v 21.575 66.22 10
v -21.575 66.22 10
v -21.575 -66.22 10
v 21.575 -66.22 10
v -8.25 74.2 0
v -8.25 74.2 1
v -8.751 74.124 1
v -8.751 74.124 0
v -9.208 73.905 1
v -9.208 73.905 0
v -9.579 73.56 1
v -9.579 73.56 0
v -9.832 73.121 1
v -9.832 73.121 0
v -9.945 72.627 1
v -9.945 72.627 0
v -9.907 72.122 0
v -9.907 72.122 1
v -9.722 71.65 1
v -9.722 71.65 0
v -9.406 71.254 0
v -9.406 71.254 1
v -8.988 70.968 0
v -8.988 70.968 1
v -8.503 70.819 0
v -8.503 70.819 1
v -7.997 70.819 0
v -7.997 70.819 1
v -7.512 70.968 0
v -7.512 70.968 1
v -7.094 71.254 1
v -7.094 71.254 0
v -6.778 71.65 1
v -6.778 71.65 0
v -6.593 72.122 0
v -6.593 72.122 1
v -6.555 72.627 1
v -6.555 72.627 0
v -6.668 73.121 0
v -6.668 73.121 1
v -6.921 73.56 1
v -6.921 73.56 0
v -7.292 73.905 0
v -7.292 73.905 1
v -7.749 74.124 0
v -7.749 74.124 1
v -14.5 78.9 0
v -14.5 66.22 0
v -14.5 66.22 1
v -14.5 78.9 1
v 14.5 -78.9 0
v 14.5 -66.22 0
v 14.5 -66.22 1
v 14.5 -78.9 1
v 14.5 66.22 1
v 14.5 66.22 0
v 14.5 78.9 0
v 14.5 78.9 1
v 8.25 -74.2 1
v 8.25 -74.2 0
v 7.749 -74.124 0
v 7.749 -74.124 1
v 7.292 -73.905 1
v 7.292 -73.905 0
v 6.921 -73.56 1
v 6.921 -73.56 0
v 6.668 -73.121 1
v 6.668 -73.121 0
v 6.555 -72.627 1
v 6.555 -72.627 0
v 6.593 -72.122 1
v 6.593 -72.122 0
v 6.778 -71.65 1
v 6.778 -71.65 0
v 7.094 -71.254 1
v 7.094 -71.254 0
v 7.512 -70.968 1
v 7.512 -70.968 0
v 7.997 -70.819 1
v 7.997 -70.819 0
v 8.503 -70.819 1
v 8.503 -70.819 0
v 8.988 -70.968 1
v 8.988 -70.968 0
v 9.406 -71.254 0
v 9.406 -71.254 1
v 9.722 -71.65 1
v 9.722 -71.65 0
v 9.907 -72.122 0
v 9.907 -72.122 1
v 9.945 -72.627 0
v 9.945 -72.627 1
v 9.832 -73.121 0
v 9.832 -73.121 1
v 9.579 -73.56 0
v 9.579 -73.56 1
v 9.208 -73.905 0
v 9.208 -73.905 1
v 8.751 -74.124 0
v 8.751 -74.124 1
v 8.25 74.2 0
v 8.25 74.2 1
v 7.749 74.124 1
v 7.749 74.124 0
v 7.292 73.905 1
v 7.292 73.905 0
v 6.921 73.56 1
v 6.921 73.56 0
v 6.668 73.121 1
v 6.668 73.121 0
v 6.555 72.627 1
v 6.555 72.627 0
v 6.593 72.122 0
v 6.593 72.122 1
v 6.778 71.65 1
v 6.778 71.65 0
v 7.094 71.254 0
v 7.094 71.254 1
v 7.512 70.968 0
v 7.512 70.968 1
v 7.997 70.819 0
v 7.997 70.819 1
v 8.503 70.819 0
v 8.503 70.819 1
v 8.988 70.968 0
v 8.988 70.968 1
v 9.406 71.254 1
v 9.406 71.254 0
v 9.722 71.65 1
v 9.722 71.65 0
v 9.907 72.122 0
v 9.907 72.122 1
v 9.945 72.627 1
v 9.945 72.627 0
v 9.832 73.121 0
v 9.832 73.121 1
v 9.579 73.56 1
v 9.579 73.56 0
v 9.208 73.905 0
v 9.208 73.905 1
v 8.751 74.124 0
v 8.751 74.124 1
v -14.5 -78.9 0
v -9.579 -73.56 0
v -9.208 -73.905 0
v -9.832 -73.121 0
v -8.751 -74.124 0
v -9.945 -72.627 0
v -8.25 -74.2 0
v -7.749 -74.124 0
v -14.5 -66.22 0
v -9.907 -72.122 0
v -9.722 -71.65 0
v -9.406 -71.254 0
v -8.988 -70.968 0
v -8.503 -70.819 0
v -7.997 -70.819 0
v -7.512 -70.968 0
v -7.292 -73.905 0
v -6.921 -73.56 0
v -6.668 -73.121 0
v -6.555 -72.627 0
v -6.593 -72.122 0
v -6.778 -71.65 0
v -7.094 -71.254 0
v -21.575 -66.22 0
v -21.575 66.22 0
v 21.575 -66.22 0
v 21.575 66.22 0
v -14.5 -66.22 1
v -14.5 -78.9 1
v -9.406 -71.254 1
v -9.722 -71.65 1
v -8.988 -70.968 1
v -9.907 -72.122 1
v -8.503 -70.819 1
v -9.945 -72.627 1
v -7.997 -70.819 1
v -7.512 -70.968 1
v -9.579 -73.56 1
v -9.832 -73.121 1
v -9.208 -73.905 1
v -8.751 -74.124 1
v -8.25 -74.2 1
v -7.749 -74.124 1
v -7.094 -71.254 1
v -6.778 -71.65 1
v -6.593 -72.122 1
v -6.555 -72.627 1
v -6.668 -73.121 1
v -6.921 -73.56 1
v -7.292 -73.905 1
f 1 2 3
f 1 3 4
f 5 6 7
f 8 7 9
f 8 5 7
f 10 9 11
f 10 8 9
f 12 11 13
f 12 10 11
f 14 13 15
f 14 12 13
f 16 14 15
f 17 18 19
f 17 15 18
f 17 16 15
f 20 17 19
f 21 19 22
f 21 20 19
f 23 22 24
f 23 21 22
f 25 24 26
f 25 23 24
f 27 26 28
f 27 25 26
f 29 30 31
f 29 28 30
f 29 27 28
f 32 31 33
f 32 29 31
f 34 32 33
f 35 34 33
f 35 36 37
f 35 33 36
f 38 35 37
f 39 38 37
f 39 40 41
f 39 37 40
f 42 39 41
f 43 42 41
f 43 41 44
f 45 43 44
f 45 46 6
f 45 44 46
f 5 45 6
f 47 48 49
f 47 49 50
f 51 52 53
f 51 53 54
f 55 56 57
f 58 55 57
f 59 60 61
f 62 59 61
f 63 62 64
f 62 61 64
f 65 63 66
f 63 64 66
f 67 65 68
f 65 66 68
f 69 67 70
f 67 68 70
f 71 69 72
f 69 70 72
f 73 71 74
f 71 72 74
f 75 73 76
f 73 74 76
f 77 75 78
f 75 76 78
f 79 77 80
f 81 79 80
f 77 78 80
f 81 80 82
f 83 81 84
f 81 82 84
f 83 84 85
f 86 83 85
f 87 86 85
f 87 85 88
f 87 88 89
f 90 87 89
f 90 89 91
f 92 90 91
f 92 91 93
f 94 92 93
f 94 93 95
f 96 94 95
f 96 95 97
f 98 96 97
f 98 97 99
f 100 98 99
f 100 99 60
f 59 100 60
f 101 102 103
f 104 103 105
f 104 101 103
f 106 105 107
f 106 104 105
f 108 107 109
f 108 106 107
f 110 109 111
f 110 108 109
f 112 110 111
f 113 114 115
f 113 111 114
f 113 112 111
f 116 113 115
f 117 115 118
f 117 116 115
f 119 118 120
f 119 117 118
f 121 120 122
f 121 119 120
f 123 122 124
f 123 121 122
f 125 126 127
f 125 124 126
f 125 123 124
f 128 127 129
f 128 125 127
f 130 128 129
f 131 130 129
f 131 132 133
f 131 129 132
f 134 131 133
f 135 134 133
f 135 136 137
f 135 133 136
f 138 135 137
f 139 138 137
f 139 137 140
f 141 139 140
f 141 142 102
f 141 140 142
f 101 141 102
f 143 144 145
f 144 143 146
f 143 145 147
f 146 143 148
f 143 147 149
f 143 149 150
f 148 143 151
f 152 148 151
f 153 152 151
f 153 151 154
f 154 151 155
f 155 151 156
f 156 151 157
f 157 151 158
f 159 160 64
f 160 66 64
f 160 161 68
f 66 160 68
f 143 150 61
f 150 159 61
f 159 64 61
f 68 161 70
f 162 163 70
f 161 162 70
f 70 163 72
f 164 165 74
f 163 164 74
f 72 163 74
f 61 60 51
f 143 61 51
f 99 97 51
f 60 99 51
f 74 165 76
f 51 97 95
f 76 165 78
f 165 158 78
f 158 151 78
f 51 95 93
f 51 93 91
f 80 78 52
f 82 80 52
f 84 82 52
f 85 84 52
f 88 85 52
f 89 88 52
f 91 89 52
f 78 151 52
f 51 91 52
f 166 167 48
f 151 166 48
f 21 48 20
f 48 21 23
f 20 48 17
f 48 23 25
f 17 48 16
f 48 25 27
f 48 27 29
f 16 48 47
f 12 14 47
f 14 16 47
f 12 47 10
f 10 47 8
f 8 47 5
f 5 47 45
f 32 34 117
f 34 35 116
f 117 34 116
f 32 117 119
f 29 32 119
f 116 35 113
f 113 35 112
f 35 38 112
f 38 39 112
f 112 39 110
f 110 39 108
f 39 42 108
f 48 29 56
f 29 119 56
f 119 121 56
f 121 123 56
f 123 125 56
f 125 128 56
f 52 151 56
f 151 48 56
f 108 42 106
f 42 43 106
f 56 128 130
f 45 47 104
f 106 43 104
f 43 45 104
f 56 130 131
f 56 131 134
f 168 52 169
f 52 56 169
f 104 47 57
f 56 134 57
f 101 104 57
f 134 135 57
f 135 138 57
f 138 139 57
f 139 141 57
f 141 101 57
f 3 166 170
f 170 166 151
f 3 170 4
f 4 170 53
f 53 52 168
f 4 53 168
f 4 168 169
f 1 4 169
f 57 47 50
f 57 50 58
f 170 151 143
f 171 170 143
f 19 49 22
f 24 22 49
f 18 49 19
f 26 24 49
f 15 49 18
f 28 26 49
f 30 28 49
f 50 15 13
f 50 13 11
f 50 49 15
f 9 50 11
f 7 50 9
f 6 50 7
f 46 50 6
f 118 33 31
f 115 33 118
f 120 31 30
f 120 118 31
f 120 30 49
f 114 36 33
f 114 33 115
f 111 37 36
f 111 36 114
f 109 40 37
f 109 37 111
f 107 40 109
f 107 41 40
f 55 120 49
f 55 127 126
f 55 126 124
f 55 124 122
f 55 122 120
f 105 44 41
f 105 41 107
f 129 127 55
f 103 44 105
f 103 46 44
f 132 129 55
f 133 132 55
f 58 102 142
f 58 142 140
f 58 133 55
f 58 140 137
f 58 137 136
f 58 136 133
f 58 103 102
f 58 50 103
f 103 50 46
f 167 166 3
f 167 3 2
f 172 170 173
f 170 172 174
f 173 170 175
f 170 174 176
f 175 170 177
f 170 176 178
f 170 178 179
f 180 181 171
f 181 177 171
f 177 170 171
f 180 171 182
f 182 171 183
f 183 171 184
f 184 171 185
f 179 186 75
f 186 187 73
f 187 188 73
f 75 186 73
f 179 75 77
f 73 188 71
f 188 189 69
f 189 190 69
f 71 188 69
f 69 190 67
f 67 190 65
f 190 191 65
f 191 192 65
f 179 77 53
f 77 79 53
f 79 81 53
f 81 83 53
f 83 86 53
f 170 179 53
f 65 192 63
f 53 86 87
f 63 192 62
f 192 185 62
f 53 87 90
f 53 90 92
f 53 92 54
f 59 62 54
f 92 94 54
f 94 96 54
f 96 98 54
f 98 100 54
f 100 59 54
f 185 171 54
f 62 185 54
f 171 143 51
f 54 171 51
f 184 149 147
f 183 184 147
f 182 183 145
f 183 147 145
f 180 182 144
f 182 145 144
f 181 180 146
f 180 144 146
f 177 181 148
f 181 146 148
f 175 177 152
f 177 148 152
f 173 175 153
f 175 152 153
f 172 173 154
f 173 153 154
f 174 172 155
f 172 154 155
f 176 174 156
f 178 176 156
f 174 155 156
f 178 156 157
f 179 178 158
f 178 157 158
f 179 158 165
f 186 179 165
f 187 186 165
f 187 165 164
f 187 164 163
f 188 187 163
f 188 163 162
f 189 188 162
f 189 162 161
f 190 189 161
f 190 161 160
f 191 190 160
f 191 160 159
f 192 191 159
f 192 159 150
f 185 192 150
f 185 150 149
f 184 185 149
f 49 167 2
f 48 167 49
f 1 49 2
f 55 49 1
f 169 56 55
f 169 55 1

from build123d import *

# Parameters (mm, degrees)
SKETCH003_W  = 43.15
SKETCH003_H  = 132.44
PAD_DEPTH    = 10
SKETCH004_W  = 29
SKETCH004_H  = 12.68
PAD001_DEPTH = 1
BINDER002_R  = 1.7
POCKET_DEPTH = 5


with BuildPart() as part:
    # Sketch003 → Pad (new body)
    with BuildSketch(Plane.XY):
        Rectangle(SKETCH003_W, SKETCH003_H)
    extrude(amount=PAD_DEPTH)

    # Sketch004 → Pad001 (join)
    with BuildSketch(Plane.XY):
        with Locations((0, 72.56)):
            Rectangle(SKETCH004_W, SKETCH004_H)
    pad001 = extrude(amount=PAD001_DEPTH)

    # Binder002 → Pocket (cut)
    with BuildSketch(Plane(origin=(-8.25, -72.5, 0), x_dir=(0, 1, 0), z_dir=(0, 0, 1))):
        Circle(BINDER002_R)
        with Locations((0, -16.5)):
            Circle(BINDER002_R)
        with Locations((145, 0)):
            Circle(BINDER002_R)
        with Locations((145, -16.5)):
            Circle(BINDER002_R)
    pocket = extrude(amount=POCKET_DEPTH, mode=Mode.SUBTRACT)

    # Mirrored: Pad001, Pocket across Sketch004 H_Axis
    add(pad001.mirror(Plane.ZX))
    add(pocket.mirror(Plane.ZX), mode=Mode.SUBTRACT)


solid = part.part
